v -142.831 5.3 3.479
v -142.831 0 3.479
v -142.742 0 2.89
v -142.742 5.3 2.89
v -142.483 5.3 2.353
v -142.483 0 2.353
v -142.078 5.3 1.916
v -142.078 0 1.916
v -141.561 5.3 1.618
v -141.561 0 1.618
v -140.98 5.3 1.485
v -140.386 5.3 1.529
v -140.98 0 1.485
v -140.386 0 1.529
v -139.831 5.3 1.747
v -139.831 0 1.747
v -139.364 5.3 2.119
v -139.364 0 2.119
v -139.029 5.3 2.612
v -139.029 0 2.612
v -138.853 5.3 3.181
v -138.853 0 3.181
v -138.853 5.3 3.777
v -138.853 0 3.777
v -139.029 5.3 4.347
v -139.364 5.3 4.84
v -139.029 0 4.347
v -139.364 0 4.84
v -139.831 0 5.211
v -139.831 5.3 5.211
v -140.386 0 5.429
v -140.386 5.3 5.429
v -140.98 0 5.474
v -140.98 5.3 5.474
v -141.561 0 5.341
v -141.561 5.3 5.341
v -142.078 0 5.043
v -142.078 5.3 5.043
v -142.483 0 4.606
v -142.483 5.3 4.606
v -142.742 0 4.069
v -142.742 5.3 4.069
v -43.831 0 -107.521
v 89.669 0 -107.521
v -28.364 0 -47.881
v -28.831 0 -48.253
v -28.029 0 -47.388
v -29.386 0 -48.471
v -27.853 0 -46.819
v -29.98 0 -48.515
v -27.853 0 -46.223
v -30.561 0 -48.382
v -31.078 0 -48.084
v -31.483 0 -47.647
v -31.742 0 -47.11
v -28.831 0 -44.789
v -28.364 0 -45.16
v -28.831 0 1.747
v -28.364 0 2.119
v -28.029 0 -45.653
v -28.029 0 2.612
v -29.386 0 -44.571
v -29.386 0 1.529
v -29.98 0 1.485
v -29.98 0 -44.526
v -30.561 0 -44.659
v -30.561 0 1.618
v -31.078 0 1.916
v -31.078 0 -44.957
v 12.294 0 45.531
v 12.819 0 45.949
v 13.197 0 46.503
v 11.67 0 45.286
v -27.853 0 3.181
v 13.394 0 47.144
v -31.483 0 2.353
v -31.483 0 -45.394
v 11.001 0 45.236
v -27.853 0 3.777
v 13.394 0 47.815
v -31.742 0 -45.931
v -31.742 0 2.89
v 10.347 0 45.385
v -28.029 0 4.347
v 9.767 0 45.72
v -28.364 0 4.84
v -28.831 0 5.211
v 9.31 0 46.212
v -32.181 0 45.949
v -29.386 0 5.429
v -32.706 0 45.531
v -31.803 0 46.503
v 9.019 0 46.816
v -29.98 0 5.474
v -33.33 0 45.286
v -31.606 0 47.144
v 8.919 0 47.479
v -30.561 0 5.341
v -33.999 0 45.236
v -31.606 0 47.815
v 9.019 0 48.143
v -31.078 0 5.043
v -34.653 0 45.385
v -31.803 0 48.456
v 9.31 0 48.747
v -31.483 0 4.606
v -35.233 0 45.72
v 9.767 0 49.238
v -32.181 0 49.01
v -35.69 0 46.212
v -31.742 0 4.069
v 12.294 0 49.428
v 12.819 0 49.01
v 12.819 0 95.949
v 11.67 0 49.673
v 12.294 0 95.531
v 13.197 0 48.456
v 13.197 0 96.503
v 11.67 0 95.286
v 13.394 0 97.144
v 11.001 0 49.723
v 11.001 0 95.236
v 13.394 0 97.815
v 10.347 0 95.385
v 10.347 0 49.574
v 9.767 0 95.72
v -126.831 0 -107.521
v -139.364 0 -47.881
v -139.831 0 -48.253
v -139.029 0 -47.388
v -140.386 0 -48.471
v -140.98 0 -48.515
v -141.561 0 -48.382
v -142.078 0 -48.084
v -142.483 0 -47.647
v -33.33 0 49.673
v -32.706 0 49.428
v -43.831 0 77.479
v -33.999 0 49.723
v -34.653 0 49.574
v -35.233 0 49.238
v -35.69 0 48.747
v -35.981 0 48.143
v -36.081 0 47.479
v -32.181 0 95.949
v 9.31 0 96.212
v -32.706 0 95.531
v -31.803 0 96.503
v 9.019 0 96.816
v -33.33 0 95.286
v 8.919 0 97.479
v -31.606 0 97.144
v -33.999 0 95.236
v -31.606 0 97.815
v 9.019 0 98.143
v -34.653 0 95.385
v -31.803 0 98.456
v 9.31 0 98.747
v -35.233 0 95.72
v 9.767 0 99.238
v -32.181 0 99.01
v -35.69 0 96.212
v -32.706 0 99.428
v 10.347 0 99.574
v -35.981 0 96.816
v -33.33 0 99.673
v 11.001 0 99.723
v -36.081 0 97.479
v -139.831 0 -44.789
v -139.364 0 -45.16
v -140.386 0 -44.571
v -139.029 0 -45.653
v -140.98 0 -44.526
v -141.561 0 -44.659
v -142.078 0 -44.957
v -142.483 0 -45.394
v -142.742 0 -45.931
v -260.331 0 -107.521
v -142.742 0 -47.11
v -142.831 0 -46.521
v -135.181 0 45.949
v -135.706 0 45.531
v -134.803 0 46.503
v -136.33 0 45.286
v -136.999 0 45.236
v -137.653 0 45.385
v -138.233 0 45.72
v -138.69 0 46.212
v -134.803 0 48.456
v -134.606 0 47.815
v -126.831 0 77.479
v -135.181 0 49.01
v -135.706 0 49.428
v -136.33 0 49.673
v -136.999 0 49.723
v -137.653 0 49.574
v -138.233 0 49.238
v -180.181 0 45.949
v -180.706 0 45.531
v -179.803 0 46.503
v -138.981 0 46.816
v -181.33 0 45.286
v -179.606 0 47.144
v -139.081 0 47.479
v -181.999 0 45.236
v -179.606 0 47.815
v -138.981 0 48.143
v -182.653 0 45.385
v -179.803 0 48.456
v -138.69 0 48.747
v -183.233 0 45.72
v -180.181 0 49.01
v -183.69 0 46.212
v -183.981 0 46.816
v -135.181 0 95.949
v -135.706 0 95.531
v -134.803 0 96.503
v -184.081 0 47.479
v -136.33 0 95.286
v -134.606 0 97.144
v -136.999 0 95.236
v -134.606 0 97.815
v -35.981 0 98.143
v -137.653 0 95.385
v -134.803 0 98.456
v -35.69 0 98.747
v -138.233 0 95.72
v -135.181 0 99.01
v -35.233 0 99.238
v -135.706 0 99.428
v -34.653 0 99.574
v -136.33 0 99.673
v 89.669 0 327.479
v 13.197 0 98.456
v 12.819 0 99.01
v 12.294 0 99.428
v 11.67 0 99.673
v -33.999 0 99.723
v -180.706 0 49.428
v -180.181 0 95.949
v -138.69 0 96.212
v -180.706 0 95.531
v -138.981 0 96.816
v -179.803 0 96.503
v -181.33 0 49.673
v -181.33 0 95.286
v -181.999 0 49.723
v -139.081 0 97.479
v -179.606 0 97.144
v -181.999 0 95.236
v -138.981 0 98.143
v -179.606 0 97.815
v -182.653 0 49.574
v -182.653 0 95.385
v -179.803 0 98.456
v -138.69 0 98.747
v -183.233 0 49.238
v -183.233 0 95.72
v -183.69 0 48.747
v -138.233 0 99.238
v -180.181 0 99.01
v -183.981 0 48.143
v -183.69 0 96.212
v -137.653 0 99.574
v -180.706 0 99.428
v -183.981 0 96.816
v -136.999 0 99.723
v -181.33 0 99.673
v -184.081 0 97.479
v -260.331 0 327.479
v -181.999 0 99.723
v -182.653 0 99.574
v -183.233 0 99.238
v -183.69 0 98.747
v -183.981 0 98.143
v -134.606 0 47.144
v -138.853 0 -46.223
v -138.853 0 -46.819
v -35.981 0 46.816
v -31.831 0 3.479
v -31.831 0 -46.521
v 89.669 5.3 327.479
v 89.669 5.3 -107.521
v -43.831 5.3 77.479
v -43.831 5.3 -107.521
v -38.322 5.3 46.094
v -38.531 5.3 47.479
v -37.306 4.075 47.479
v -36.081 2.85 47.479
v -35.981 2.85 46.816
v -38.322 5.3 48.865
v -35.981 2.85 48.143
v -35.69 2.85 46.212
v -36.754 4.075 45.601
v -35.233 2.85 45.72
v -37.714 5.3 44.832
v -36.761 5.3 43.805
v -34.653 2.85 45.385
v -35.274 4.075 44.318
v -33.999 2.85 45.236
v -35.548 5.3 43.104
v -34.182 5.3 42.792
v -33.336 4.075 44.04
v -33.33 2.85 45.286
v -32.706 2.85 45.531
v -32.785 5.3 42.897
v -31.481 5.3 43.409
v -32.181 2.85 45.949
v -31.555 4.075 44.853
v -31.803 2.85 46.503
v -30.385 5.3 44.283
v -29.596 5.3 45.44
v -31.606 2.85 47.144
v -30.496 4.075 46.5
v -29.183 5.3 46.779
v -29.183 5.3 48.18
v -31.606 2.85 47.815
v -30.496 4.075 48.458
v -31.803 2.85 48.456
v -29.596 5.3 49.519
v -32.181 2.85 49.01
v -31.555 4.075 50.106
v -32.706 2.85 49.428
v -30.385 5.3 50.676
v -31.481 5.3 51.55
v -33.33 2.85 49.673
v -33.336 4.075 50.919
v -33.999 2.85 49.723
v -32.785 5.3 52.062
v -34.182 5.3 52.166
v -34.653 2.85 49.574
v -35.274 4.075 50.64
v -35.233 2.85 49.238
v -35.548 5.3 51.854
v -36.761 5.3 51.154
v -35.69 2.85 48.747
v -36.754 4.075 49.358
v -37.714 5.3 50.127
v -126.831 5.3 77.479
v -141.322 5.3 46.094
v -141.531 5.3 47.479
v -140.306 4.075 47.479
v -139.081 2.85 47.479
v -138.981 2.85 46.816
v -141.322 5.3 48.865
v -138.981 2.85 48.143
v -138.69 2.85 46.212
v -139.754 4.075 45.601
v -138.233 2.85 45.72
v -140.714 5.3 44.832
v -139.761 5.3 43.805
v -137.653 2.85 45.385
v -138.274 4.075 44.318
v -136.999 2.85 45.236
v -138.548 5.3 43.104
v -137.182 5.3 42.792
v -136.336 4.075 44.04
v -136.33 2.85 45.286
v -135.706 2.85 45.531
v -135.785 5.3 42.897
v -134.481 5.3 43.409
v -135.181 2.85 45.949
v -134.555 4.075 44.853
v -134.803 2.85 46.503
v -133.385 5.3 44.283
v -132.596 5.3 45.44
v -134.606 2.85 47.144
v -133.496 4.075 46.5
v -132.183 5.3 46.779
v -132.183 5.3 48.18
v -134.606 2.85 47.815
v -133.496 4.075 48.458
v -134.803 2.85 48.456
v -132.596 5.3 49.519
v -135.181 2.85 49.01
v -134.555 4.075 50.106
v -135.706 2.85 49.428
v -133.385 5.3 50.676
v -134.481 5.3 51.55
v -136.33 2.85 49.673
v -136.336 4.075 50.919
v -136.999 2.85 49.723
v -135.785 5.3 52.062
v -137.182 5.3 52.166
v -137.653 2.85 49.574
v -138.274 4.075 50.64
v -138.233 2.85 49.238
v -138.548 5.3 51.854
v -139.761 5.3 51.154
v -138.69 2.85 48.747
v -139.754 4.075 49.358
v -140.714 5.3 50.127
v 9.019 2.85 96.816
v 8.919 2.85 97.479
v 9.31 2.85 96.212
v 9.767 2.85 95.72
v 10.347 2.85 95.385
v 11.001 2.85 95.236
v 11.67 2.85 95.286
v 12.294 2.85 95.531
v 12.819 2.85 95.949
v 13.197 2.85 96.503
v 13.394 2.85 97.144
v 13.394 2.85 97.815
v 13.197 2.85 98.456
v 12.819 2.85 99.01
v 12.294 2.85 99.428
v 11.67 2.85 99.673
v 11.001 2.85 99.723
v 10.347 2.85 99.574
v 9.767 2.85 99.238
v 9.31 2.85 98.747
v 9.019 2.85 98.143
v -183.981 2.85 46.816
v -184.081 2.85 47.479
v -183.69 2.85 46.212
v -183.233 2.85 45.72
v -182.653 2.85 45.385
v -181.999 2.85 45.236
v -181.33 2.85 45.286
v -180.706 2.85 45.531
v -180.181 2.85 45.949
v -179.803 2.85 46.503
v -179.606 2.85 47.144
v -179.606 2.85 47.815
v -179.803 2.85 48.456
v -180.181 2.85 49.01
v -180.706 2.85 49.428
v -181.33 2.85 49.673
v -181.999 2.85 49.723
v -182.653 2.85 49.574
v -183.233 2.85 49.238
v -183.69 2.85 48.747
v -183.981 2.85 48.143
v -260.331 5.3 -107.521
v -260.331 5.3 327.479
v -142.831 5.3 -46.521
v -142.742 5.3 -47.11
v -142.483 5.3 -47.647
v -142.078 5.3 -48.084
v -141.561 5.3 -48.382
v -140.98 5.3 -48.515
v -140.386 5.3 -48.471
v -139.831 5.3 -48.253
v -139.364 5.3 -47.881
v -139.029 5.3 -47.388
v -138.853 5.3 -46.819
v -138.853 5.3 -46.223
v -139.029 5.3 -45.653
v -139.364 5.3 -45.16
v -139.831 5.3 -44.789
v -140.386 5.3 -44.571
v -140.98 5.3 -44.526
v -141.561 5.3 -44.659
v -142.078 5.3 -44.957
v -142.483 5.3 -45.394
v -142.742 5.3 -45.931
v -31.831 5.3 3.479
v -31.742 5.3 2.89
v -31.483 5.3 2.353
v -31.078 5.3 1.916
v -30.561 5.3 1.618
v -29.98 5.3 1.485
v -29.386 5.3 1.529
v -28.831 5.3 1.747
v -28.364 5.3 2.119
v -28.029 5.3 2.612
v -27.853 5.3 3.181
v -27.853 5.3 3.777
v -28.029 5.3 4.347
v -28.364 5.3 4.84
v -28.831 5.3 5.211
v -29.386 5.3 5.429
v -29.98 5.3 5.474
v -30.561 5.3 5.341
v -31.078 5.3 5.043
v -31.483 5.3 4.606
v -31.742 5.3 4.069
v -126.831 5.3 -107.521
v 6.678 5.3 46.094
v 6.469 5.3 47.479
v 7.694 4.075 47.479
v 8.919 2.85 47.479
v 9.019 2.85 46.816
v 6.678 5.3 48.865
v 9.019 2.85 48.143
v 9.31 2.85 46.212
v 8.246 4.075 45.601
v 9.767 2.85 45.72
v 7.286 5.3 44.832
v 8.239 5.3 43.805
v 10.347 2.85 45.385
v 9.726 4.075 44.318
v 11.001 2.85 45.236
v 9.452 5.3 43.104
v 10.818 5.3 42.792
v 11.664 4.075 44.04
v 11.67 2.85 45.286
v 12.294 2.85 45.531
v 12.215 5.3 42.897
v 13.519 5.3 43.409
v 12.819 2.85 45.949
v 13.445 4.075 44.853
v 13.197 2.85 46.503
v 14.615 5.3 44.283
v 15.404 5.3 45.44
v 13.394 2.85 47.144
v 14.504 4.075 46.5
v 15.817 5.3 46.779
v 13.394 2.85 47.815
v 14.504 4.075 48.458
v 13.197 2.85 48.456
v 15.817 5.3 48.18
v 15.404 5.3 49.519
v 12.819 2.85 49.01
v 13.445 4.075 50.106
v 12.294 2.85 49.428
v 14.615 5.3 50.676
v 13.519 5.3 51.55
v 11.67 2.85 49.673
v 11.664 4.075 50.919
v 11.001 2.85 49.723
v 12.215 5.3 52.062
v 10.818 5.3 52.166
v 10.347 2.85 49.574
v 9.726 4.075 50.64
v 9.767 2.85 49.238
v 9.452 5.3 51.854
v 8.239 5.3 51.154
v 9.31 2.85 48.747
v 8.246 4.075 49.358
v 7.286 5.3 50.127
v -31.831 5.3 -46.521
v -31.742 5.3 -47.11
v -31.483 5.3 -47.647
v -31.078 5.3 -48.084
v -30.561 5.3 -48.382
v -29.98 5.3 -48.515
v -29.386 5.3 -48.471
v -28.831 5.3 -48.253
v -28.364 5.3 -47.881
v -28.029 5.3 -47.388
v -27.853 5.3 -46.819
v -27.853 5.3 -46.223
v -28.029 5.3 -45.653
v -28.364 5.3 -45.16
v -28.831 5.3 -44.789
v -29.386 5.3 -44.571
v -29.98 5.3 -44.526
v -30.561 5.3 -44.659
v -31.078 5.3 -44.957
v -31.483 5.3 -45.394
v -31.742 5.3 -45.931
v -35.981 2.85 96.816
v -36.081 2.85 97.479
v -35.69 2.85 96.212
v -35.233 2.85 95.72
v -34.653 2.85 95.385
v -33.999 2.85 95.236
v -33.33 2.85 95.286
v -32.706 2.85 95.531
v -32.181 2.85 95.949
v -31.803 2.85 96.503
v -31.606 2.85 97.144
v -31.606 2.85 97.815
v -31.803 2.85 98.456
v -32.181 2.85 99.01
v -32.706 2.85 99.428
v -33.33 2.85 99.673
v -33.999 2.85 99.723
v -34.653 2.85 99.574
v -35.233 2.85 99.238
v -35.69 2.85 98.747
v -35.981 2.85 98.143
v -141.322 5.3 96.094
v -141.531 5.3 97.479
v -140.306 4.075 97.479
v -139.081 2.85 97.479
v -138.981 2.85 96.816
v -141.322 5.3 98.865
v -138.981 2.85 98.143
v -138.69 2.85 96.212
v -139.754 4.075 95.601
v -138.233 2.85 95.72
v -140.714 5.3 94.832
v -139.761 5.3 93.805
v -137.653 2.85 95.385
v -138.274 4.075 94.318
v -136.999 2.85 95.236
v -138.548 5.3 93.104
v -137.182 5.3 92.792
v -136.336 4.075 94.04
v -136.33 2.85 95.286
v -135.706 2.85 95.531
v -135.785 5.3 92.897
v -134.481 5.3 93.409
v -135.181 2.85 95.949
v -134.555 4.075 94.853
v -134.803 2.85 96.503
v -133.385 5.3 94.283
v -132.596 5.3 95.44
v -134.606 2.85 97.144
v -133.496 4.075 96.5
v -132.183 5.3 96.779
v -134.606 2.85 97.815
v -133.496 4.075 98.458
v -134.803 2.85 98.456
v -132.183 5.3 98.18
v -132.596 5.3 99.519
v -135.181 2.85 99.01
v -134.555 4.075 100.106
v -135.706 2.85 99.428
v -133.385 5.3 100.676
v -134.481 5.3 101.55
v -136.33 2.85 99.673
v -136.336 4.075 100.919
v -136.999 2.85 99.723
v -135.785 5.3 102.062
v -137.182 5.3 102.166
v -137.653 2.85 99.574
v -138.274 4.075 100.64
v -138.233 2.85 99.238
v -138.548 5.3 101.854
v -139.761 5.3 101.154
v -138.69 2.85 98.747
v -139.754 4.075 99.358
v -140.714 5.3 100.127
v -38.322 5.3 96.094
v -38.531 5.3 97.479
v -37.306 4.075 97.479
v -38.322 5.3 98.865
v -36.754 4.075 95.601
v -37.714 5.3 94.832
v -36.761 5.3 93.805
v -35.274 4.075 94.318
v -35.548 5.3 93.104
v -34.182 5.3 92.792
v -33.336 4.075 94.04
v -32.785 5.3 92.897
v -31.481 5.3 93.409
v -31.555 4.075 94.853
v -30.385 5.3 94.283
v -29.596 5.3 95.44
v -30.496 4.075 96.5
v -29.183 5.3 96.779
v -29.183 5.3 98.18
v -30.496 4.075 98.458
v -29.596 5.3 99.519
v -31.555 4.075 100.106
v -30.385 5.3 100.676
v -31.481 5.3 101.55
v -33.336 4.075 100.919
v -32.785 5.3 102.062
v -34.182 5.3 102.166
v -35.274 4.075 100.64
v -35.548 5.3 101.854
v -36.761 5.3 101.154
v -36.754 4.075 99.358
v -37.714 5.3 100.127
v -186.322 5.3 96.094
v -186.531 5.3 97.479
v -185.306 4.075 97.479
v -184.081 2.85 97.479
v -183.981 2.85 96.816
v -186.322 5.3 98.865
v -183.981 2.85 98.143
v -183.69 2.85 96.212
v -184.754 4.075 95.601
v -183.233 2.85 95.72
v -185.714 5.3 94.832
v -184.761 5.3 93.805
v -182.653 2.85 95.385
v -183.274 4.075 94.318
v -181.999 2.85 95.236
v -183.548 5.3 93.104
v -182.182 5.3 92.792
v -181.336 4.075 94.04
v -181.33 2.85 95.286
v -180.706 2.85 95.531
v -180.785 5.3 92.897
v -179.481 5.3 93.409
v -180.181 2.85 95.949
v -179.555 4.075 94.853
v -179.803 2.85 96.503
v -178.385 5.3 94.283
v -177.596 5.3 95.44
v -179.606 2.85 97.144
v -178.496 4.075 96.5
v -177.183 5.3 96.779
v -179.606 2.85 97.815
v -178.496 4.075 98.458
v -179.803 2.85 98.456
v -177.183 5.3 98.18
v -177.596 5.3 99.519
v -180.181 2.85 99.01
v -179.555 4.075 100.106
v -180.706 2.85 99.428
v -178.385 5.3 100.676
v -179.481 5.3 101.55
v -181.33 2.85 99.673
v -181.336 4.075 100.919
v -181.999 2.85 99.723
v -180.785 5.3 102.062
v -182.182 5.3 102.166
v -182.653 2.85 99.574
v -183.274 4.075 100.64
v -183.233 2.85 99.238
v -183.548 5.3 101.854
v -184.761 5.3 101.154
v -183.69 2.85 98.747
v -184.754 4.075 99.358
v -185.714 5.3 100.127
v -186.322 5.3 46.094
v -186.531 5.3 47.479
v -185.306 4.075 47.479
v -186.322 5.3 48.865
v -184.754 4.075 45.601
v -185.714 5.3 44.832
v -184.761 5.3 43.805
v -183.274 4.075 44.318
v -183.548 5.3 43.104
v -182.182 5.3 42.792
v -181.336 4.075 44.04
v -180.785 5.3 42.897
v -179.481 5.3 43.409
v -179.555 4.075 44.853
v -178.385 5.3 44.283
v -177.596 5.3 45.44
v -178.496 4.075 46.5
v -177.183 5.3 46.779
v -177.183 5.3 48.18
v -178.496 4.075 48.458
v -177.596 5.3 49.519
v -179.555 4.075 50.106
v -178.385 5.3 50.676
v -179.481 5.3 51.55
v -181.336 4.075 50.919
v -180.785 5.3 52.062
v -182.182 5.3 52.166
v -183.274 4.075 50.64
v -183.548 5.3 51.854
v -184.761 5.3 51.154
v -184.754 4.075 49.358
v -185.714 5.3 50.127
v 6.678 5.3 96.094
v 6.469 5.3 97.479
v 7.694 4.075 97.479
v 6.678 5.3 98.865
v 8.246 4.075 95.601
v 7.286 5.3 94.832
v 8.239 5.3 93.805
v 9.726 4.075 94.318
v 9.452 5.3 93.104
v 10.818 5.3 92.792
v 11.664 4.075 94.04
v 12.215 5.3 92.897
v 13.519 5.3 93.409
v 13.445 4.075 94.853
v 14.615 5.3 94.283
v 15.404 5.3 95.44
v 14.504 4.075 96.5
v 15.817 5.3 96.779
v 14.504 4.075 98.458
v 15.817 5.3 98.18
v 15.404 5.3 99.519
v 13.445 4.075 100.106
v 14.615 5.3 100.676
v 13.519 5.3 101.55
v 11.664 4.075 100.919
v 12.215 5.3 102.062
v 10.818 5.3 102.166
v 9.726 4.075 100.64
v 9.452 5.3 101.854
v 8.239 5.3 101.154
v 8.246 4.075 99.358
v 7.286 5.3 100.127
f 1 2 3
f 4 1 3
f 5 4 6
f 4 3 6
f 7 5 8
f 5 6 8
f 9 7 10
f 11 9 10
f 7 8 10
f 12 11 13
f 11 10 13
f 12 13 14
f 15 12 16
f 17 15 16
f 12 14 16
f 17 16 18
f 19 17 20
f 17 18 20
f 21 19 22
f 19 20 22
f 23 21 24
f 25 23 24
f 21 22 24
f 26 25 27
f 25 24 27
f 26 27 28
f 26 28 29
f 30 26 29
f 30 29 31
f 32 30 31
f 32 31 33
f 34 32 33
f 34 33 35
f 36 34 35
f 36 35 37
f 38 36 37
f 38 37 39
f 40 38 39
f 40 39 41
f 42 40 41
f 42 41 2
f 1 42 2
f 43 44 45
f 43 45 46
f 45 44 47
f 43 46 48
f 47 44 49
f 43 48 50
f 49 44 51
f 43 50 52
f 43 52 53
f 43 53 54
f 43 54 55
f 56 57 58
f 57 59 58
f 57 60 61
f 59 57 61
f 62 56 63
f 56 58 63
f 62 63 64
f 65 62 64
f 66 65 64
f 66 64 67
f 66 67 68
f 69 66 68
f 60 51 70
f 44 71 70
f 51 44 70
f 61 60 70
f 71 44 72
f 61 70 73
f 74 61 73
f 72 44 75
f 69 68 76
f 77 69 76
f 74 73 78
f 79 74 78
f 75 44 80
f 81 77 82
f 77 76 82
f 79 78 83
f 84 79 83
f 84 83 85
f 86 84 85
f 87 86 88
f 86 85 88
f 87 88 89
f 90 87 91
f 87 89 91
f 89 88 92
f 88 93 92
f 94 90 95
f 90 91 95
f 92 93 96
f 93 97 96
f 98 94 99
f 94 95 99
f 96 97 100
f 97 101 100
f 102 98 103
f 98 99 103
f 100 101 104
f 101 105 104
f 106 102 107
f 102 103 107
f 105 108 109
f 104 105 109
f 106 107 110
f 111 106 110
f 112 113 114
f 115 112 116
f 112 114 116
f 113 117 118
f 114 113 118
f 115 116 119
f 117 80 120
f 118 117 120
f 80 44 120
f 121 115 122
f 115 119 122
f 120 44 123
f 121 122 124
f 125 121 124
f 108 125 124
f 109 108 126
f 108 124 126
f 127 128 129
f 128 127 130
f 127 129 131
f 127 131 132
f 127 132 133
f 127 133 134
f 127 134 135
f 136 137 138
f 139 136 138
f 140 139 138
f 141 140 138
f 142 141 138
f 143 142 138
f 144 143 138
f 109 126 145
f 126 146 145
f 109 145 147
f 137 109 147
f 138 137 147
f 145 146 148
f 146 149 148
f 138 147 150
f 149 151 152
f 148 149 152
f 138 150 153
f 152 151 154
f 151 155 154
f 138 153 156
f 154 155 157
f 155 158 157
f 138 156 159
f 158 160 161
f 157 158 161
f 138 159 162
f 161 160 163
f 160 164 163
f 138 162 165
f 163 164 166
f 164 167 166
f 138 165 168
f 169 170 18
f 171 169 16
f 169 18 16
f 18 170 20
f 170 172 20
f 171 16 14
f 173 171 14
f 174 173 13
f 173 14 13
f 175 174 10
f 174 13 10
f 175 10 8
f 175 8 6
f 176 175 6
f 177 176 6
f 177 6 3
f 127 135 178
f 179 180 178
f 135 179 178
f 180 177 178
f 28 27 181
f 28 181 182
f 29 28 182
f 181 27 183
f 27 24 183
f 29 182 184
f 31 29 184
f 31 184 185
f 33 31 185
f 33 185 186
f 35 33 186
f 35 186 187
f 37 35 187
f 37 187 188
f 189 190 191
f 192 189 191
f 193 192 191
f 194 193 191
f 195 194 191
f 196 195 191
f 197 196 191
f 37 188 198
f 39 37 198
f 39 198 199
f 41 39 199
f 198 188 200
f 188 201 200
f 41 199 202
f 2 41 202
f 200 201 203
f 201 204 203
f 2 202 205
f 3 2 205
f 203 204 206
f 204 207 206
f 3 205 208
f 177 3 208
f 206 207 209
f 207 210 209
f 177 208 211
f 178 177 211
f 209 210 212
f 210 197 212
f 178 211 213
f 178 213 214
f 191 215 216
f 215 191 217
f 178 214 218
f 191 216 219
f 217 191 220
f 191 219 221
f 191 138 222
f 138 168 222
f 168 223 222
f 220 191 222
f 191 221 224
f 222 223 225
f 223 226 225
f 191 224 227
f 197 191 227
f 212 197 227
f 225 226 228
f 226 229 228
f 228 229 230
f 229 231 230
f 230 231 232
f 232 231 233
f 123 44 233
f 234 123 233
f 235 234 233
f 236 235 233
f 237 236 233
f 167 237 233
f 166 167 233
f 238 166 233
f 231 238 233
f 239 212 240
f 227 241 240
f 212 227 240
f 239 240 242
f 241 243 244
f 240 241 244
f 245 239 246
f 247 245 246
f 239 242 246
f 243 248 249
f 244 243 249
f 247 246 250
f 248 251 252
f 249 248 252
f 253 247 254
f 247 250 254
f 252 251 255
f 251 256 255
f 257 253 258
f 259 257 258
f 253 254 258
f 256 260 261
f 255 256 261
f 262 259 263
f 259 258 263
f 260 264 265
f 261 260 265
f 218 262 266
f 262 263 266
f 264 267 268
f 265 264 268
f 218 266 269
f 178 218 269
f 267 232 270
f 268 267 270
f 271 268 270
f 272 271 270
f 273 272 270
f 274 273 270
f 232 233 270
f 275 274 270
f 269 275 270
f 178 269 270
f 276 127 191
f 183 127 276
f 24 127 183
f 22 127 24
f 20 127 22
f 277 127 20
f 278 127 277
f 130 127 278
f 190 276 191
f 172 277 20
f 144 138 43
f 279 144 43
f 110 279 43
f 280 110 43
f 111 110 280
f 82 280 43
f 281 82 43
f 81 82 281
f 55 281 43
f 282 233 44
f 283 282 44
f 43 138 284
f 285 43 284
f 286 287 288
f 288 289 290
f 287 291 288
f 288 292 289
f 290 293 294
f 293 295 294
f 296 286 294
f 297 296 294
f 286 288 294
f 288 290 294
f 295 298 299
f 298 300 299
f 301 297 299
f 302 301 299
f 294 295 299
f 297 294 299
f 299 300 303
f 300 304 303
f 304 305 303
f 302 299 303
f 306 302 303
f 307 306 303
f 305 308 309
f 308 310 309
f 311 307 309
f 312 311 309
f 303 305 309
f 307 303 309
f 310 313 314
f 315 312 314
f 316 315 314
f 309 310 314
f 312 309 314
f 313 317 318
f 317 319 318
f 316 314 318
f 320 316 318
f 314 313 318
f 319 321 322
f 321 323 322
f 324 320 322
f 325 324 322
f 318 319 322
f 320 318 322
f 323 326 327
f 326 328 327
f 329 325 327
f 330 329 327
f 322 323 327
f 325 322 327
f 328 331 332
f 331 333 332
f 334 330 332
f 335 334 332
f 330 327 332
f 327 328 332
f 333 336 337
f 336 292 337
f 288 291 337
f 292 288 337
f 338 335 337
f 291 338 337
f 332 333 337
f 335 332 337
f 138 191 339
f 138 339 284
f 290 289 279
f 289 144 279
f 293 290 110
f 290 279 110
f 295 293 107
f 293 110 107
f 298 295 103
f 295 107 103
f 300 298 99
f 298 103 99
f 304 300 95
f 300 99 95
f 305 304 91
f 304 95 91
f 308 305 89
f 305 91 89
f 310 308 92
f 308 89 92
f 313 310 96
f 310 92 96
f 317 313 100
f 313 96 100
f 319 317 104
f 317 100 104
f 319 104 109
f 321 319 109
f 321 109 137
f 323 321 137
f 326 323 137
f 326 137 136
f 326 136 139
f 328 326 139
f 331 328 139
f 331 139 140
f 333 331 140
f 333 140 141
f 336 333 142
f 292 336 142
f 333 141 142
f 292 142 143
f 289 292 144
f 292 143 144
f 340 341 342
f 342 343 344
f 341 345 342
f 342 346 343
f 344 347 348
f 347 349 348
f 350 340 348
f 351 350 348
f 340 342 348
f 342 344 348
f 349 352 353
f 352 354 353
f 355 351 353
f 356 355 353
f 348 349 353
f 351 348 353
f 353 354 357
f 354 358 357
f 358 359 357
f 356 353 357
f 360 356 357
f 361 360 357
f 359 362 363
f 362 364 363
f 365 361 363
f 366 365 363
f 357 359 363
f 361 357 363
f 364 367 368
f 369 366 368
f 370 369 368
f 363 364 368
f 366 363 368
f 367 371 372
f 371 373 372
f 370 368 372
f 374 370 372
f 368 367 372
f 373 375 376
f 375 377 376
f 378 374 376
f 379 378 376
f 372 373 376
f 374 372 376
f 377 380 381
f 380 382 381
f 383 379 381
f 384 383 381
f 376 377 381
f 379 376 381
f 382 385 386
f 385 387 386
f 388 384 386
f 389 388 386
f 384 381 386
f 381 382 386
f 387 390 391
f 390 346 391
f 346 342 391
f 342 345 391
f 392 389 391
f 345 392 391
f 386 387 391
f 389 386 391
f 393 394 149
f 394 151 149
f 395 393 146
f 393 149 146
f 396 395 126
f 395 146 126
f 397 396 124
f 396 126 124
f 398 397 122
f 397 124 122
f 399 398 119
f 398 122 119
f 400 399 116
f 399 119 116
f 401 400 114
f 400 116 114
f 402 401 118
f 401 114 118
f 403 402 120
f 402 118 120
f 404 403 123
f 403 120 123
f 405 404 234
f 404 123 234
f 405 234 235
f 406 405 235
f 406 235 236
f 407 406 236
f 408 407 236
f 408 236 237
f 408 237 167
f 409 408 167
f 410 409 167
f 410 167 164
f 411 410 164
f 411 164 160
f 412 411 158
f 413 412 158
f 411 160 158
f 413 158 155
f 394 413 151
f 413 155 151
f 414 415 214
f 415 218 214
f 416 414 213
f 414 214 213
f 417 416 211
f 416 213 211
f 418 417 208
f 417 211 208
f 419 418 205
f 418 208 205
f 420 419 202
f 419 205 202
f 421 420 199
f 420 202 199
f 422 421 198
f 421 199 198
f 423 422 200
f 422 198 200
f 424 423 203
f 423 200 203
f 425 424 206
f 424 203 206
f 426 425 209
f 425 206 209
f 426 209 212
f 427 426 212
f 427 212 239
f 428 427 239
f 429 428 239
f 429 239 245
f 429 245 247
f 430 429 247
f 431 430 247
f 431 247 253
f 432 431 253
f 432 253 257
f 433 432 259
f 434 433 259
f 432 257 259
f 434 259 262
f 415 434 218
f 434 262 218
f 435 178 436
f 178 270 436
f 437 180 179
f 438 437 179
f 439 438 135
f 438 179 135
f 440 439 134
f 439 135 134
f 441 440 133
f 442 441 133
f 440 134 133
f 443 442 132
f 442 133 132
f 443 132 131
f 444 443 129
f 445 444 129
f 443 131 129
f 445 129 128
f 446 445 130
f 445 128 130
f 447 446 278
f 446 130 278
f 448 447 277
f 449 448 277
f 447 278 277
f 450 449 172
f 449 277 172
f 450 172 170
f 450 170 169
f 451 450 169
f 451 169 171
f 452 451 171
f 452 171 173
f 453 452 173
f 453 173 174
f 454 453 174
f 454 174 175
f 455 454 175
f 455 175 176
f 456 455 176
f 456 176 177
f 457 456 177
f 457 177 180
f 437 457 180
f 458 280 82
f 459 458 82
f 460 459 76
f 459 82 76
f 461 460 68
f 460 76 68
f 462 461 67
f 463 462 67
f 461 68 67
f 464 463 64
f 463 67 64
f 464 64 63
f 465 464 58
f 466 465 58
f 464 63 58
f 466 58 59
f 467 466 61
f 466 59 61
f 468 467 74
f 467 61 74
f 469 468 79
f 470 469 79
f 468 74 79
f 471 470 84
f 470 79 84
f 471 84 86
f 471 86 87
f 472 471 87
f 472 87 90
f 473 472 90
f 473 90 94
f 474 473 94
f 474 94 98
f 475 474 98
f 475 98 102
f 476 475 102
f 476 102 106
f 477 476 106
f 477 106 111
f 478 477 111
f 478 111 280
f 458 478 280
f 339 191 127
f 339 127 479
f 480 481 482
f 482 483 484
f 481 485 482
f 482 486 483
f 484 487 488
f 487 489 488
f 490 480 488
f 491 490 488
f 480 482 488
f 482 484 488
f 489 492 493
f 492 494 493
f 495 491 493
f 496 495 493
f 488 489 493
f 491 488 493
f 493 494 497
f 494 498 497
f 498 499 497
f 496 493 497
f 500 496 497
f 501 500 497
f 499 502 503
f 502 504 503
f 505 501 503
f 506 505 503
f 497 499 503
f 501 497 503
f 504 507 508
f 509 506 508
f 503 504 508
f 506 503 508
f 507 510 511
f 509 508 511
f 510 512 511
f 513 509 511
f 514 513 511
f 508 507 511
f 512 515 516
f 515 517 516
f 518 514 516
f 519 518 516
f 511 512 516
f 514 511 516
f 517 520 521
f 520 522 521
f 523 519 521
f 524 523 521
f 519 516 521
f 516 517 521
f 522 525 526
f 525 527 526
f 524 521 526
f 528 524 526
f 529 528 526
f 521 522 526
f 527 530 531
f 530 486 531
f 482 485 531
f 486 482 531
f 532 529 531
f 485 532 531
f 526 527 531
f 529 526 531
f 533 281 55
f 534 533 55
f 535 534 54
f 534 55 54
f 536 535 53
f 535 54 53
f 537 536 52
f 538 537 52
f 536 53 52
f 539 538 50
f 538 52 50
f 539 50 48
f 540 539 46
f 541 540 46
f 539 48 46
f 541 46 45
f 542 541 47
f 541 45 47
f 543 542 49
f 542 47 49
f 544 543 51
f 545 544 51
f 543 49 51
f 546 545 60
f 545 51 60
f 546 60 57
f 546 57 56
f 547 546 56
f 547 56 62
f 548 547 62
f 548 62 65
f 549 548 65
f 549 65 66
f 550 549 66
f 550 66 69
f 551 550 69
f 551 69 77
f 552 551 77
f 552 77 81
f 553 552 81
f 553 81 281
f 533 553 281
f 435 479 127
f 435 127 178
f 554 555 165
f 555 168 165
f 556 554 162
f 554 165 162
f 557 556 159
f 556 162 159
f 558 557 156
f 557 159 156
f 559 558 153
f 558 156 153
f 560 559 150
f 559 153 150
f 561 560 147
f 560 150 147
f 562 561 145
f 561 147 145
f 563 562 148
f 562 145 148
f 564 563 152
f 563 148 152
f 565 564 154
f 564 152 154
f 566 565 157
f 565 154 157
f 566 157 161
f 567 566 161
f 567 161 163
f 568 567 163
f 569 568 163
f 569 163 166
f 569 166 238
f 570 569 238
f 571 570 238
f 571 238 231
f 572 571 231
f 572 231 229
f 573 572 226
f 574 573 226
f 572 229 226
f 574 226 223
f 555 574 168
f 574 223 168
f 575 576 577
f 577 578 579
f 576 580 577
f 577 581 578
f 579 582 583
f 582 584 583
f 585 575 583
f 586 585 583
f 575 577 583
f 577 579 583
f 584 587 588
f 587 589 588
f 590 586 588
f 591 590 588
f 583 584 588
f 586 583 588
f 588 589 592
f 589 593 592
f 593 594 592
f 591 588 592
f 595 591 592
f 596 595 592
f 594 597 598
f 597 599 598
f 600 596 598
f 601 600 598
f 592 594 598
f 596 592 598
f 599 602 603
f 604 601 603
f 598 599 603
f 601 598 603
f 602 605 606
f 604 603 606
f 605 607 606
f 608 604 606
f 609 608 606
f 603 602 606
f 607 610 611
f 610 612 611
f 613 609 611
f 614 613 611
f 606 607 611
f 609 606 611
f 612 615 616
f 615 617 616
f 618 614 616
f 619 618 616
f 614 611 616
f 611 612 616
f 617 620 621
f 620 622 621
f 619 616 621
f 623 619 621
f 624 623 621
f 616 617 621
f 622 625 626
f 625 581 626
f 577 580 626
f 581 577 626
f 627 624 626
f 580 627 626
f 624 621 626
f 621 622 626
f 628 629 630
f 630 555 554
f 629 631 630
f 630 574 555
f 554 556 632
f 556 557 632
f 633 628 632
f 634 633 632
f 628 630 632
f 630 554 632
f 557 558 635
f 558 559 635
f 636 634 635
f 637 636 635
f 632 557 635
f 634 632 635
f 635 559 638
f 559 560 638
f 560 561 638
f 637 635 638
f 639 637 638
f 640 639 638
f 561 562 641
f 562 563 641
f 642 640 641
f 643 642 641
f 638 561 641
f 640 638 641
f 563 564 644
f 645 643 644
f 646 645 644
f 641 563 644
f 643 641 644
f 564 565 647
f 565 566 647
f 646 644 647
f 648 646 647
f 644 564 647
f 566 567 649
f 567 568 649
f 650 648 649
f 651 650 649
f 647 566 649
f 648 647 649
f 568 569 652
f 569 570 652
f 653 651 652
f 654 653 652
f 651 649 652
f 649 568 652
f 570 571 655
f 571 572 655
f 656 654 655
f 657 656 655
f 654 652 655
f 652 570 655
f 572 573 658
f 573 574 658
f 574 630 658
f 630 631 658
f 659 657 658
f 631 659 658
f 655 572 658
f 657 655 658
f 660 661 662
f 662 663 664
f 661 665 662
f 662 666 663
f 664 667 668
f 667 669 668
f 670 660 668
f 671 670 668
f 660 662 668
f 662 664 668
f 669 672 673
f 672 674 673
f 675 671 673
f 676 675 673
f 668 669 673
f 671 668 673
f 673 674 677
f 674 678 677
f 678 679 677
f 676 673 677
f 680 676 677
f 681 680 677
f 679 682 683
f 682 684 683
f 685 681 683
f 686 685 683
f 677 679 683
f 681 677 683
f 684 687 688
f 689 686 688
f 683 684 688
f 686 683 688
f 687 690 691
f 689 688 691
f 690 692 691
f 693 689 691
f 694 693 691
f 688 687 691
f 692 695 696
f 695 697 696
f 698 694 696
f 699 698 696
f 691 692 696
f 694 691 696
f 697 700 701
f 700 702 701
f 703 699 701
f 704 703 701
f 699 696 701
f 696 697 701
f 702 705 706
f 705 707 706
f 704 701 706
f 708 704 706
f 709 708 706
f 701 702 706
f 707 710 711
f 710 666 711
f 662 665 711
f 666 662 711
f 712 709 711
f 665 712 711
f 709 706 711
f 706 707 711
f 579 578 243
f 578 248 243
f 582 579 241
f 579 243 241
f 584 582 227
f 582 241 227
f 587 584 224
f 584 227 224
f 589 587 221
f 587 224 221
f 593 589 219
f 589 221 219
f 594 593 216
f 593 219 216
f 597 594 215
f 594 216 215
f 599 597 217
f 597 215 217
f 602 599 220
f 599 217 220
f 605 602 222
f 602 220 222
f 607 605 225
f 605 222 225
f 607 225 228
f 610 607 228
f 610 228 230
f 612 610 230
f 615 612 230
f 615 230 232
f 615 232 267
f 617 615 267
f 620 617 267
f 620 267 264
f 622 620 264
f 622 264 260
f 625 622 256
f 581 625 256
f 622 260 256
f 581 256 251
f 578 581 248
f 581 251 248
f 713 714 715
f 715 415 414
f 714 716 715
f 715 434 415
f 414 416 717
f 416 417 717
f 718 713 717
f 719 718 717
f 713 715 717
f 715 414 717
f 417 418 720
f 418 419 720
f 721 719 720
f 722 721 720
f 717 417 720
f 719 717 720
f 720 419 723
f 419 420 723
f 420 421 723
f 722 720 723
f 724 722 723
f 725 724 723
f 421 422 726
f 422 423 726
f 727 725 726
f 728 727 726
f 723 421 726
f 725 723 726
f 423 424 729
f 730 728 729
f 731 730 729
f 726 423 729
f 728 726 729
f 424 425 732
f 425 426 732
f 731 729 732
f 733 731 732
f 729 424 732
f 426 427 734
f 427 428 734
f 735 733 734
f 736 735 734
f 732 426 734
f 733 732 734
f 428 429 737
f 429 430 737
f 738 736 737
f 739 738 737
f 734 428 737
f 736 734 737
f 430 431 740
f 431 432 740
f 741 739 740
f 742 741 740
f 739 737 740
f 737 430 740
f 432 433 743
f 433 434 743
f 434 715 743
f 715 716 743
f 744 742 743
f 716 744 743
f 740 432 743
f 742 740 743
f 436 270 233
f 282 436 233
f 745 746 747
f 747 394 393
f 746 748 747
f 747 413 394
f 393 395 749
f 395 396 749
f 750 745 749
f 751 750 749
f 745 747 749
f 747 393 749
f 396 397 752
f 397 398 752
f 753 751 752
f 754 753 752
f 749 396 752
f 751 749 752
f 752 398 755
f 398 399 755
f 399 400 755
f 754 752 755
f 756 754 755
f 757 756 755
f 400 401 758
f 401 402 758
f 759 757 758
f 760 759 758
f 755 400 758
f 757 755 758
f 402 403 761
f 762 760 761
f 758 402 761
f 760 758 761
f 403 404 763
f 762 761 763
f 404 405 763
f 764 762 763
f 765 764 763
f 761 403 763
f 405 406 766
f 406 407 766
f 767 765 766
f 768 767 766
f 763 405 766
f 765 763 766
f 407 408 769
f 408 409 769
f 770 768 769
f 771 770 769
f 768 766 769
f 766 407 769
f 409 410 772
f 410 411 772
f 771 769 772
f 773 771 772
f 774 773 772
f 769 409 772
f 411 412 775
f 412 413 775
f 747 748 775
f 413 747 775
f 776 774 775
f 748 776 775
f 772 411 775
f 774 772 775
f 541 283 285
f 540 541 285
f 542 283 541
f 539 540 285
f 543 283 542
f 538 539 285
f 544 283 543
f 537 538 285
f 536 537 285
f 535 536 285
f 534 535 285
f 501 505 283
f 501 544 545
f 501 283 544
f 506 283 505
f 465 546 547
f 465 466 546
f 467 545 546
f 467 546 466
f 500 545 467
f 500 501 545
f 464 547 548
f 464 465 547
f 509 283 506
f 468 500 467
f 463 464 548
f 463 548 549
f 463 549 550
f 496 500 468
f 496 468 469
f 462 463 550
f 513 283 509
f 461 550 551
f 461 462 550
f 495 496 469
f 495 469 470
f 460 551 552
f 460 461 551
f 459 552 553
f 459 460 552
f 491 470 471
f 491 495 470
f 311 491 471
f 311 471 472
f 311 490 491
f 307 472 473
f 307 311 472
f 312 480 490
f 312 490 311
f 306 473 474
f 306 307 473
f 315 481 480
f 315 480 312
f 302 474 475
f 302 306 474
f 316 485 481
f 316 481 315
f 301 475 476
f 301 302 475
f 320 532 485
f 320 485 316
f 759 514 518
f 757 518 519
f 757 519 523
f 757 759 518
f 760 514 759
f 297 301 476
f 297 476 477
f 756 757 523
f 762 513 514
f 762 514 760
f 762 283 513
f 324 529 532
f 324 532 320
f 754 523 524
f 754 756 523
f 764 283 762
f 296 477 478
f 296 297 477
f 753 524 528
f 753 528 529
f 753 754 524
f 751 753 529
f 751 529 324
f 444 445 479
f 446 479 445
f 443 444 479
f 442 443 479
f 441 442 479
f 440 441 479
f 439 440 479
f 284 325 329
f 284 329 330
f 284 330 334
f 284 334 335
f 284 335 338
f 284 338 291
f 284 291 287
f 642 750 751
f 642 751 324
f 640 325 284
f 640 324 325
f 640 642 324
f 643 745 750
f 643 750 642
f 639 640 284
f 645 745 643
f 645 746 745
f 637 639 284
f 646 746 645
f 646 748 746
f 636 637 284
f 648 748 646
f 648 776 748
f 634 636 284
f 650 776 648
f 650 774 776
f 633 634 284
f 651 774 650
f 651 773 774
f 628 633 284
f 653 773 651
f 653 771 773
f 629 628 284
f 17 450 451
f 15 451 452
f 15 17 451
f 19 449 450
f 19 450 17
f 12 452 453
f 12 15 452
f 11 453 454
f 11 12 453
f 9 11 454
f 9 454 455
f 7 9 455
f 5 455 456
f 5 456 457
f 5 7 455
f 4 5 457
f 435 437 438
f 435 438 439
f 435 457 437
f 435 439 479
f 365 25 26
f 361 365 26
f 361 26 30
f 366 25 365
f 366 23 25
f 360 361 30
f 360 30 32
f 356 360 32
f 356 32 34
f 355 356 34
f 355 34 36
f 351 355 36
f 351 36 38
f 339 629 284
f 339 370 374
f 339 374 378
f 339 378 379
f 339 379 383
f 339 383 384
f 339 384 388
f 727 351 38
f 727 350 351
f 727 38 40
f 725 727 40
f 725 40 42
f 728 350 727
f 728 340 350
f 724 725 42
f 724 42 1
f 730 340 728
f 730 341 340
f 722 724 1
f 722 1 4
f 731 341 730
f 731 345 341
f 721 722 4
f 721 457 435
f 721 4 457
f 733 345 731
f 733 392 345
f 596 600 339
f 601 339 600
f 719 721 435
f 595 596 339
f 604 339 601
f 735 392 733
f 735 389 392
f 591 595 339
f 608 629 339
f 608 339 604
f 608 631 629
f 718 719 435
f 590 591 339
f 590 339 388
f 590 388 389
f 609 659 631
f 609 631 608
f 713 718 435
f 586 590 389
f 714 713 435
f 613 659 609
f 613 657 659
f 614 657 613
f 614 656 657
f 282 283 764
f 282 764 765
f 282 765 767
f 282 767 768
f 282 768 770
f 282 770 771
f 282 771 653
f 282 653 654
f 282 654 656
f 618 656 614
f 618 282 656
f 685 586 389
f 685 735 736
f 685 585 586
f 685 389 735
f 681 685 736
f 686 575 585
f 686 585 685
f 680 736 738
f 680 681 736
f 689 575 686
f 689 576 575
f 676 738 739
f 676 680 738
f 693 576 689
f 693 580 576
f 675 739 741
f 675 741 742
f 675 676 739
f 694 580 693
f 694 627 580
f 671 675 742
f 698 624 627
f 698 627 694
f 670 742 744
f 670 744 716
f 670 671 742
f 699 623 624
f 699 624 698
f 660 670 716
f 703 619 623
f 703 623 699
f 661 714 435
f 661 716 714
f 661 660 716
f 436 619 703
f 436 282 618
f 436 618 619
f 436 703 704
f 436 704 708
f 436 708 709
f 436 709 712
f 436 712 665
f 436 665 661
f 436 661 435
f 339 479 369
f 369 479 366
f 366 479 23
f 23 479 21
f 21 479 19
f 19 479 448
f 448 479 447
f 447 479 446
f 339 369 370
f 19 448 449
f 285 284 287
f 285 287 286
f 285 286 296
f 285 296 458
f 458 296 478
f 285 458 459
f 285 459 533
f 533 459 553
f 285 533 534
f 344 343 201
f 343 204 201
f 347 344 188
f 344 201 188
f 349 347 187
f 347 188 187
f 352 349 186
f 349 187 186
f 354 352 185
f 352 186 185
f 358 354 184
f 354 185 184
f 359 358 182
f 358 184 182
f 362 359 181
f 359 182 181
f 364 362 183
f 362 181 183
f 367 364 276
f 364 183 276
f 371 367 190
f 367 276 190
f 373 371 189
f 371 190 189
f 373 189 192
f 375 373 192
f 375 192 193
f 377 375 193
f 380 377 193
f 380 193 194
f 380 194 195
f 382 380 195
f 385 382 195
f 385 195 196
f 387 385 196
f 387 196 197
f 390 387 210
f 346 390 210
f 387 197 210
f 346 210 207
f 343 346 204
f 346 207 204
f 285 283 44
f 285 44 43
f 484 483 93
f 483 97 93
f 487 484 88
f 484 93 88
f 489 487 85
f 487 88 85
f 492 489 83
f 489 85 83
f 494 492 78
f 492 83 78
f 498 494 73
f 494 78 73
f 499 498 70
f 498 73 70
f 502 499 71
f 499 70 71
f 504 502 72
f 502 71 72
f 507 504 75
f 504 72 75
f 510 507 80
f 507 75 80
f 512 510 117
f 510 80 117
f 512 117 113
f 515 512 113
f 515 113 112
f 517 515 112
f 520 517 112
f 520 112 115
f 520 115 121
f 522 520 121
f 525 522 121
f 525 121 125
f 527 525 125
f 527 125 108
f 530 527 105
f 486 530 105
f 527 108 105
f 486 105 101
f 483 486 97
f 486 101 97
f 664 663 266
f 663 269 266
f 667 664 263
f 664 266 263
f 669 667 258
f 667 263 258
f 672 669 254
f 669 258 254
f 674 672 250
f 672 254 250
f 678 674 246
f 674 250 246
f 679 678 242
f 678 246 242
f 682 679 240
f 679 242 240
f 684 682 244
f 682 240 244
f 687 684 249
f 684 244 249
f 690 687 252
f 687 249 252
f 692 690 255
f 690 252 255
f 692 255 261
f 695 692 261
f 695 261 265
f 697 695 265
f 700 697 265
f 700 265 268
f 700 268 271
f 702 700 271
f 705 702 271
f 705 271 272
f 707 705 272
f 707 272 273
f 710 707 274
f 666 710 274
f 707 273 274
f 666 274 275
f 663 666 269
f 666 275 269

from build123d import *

# Parameters (mm, degrees)
SKETCH1_W                                       = 350
SKETCH1_H                                       = 250
BOSS_EXTRUDE1_DEPTH                             = 5.3
SKETCH4_W                                       = 133.5
SKETCH4_H                                       = 5.3
BOSS_EXTRUDE3_DEPTH                             = 185
F_4_0MM_DOWEL_HOLE1_D                           = 4
CSK_FOR_M4_FLAT_HEAD_MACHINE_SCREW2_D           = 4.5
CSK_FOR_M4_FLAT_HEAD_MACHINE_SCREW2_CSINK_D     = 9.4
CSK_FOR_M4_FLAT_HEAD_MACHINE_SCREW2_CSINK_ANGLE = 90


with BuildPart() as part:
    # Sketch1 → Boss-Extrude1 (new body)
    with BuildSketch(Plane(origin=(0, 0, 0), x_dir=(1, 0, 0), z_dir=(0, 1, 0))):
        with Locations((-85.330578512, -202.479338843)):
            Rectangle(SKETCH1_W, SKETCH1_H)
    extrude(amount=BOSS_EXTRUDE1_DEPTH)

    # Sketch4 → Boss-Extrude3 (add)
    with BuildSketch(Plane(origin=(0, 0, 77.479338843), x_dir=(-1, 0, 0), z_dir=(0, 0, -1))):
        with Locations((193.580578512, 2.65)):
            Rectangle(SKETCH4_W, SKETCH4_H)
        with Locations((-22.919421488, 2.65)):
            Rectangle(SKETCH4_W, SKETCH4_H)
    extrude(amount=BOSS_EXTRUDE3_DEPTH)

    # Ø4.0mm Dowel Hole1 (through all)
    with Locations(Plane(origin=(0, 5.3, 0), x_dir=(1, 0, 0), z_dir=(0, 1, 0))):
        with Locations((-181.830578512, -47.479338843), (-181.830578512, -97.479338843), (-136.830578512, -97.479338843), (-136.830578512, -47.479338843), (-33.830578512, -47.479338843), (11.169421488, -47.479338843), (11.169421488, -97.479338843), (-33.830578512, -97.479338843), (-29.830578512, -3.479338843), (-29.830578512, 46.520661157), (-140.830578512, 46.520661157), (-140.830578512, -3.479338843)):
            Hole(F_4_0MM_DOWEL_HOLE1_D / 2)

    # CSK for M4 Flat Head Machine Screw2 (through all)
    with Locations(Plane(origin=(0, 5.3, 0), x_dir=(1, 0, 0), z_dir=(0, 1, 0))):
        with Locations((-181.830578512, -47.479338843), (-136.830578512, -47.479338843), (-181.830578512, -97.479338843), (-136.830578512, -97.479338843), (-33.830578512, -47.479338843), (11.169421488, -47.479338843), (11.169421488, -97.479338843), (-33.830578512, -97.479338843)):
            CounterSinkHole(CSK_FOR_M4_FLAT_HEAD_MACHINE_SCREW2_D / 2, CSK_FOR_M4_FLAT_HEAD_MACHINE_SCREW2_CSINK_D / 2, counter_sink_angle=CSK_FOR_M4_FLAT_HEAD_MACHINE_SCREW2_CSINK_ANGLE)


solid = part.part
